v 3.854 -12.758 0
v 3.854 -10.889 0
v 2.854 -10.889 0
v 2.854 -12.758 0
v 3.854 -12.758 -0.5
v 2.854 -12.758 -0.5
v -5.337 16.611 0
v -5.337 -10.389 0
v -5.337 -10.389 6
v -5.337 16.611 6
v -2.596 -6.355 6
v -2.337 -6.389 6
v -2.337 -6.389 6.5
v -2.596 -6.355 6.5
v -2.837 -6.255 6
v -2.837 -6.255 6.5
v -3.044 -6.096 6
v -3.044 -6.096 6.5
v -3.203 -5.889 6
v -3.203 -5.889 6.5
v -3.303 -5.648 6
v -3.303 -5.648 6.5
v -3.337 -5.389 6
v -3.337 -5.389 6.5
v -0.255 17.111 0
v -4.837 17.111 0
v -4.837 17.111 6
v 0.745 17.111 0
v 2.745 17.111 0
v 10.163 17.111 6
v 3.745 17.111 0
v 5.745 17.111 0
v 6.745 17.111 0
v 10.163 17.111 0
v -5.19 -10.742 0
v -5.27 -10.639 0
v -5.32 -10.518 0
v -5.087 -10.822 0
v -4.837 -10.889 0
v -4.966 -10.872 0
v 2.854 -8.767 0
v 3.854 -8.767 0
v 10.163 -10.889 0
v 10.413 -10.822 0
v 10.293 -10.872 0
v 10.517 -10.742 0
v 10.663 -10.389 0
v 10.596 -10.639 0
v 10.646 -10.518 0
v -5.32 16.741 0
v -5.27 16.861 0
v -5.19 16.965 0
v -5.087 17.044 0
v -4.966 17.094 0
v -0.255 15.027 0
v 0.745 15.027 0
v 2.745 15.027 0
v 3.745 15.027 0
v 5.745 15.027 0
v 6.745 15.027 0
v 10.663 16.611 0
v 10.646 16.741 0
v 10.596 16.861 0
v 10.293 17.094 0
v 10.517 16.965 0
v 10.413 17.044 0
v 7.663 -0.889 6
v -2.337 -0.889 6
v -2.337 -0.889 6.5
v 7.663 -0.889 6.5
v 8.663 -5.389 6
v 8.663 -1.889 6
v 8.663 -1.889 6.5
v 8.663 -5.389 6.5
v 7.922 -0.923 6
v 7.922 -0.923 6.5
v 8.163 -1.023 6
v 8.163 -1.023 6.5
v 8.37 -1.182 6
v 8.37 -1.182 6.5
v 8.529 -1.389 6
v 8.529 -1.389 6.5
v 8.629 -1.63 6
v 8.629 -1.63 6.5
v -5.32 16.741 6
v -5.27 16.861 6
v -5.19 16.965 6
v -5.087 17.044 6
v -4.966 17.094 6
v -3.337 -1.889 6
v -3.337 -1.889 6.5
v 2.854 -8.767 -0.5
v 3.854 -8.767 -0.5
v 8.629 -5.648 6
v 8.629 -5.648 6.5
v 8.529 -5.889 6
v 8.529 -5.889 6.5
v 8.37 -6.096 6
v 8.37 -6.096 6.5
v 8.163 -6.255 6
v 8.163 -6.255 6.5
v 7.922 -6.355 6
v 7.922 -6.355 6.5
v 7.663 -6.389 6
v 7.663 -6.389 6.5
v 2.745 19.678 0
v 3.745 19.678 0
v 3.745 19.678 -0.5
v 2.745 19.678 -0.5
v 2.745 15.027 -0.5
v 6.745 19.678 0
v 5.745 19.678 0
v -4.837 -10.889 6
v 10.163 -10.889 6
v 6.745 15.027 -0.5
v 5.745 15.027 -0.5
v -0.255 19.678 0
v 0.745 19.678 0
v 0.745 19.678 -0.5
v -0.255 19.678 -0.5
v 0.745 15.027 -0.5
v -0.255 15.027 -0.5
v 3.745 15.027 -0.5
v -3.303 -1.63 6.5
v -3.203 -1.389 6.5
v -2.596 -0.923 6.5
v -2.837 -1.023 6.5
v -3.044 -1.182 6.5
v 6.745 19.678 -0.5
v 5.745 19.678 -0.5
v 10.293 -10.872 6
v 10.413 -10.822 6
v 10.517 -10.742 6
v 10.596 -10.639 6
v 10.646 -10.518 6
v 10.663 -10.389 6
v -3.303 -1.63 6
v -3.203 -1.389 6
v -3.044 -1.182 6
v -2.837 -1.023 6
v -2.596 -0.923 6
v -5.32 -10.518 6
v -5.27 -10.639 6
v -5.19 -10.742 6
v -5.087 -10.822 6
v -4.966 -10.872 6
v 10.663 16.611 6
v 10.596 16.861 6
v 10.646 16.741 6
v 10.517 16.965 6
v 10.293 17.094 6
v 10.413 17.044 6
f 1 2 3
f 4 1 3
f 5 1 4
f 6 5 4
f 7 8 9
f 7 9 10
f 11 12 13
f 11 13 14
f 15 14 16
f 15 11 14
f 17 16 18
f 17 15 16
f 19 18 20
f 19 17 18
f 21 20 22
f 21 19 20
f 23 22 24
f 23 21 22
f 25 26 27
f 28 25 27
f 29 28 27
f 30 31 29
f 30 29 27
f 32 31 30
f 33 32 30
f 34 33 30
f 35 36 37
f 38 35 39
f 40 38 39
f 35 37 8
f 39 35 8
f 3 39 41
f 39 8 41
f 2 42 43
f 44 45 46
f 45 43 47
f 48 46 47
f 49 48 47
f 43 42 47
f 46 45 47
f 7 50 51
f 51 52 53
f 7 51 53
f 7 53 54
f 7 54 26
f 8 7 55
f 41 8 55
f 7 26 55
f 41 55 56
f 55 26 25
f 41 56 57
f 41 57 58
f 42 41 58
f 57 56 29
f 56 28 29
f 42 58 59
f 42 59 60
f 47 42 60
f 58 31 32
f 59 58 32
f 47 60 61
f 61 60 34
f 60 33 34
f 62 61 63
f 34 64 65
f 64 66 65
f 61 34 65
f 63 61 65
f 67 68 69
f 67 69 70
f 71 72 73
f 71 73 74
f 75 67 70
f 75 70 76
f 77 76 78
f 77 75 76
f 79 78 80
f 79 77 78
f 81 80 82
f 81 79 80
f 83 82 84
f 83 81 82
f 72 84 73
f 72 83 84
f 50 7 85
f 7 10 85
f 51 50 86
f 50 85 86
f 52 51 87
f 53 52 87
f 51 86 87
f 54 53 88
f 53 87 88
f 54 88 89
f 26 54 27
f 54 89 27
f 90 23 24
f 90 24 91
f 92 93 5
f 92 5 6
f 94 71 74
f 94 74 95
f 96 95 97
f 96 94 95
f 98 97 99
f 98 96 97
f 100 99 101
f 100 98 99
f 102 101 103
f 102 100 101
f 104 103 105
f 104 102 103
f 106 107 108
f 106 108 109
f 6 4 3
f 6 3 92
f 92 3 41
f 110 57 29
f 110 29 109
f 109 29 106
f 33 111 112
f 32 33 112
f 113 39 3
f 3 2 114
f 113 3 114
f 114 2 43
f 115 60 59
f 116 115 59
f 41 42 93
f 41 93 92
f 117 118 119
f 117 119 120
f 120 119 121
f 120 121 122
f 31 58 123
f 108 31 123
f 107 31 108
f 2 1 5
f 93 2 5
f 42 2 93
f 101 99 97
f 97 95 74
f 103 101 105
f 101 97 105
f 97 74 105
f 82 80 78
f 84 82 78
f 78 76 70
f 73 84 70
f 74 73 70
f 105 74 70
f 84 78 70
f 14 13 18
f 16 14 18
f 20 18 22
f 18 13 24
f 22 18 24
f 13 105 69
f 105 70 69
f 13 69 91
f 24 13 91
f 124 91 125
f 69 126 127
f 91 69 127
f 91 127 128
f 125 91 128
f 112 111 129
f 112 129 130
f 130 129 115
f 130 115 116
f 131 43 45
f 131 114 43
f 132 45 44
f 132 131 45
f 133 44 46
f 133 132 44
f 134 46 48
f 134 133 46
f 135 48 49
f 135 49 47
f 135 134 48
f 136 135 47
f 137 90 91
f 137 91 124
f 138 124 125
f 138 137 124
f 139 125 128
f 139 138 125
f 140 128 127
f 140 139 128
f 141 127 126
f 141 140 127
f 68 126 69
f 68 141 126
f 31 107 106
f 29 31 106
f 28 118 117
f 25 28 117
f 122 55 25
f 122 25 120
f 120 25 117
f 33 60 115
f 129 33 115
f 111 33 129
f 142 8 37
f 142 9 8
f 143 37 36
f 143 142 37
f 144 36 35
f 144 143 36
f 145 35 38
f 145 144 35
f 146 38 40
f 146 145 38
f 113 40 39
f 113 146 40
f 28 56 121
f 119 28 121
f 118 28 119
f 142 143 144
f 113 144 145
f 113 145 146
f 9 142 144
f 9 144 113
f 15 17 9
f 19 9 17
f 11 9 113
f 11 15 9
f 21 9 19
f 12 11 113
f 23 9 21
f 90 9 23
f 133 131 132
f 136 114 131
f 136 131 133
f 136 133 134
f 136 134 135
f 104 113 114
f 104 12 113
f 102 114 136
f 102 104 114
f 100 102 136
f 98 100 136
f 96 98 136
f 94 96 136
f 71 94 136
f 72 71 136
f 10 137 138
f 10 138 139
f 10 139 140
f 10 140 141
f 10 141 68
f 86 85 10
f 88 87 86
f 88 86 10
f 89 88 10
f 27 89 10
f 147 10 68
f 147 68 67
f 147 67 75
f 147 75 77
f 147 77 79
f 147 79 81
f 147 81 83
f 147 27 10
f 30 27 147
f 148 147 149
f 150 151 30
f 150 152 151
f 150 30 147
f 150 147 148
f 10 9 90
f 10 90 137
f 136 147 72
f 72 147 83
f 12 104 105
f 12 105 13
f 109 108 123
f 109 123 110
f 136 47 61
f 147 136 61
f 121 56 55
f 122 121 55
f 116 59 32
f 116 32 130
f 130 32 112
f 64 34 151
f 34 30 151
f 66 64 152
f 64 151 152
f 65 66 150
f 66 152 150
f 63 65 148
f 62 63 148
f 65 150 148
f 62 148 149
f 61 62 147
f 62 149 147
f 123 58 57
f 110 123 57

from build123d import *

# Parameters (mm, degrees)
ESQUISSE1_W        = 16
ESQUISSE1_H        = 28
BOSS_EXTRU_1_DEPTH = 6
BOSS_EXTRU_2_DEPTH = 0.5
CONG_1_R           = 0.5
ESQUISSE3_W        = 1
ESQUISSE3_H        = 4.650680728
BOSS_EXTRU_3_DEPTH = 0.5
ESQUISSE4_W        = 1
ESQUISSE4_H        = 3.990373045
BOSS_EXTRU_4_DEPTH = 0.5


with BuildPart() as part:
    # Esquisse1 → Boss.-Extru.1 (new body)
    with BuildSketch(Plane.XY):
        with Locations((2.66318356, 3.111111111)):
            Rectangle(ESQUISSE1_W, ESQUISSE1_H)
    extrude(amount=BOSS_EXTRU_1_DEPTH)

    # Esquisse2 → Boss.-Extru.2 (add)
    with BuildSketch(Plane.XY.offset(6)):
        with BuildLine():
            Line((-2.33681644, -0.888888889), (7.66318356, -0.888888889))
            ThreePointArc((7.66318356, -0.888888889), (8.370290341, -1.181782108), (8.66318356, -1.888888889))
            Line((8.66318356, -1.888888889), (8.66318356, -5.388888889))
            ThreePointArc((8.66318356, -5.388888889), (8.370290341, -6.09599567), (7.66318356, -6.388888889))
            Line((7.66318356, -6.388888889), (-2.33681644, -6.388888889))
            ThreePointArc((-2.33681644, -6.388888889), (-3.043923221, -6.09599567), (-3.33681644, -5.388888889))
            Line((-3.33681644, -5.388888889), (-3.33681644, -1.888888889))
            ThreePointArc((-3.33681644, -1.888888889), (-3.043923221, -1.181782108), (-2.33681644, -0.888888889))
        make_face()
    extrude(amount=BOSS_EXTRU_2_DEPTH)

    # Congé1
    cong_1_edges = [part.edges().sort_by_distance(p)[0] for p in [
        (-5.33681644, 17.111111111, 3),
        (10.66318356, 17.111111111, 3),
        (10.66318356, -10.888888889, 3),
        (-5.33681644, -10.888888889, 3),
    ]]
    fillet(cong_1_edges, radius=CONG_1_R)

    # Esquisse3 → Boss.-Extru.3 (add)
    with BuildSketch(Plane(origin=(0, 0, 0), x_dir=(-1, 0, 0), z_dir=(0, 0, -1))):
        with Locations((-0.244563406, 17.352420034)):
            Rectangle(ESQUISSE3_W, ESQUISSE3_H)
        with Locations((-3.244563406, 17.352420034)):
            Rectangle(ESQUISSE3_W, ESQUISSE3_H)
        with Locations((-6.244563406, 17.352420034)):
            Rectangle(ESQUISSE3_W, ESQUISSE3_H)
    extrude(amount=BOSS_EXTRU_3_DEPTH)

    # Esquisse4 → Boss.-Extru.4 (add)
    with BuildSketch(Plane(origin=(0, 0, 0), x_dir=(-1, 0, 0), z_dir=(0, 0, -1))):
        with Locations((-3.353859388, -10.762545732)):
            Rectangle(ESQUISSE4_W, ESQUISSE4_H)
    extrude(amount=BOSS_EXTRU_4_DEPTH)


solid = part.part
